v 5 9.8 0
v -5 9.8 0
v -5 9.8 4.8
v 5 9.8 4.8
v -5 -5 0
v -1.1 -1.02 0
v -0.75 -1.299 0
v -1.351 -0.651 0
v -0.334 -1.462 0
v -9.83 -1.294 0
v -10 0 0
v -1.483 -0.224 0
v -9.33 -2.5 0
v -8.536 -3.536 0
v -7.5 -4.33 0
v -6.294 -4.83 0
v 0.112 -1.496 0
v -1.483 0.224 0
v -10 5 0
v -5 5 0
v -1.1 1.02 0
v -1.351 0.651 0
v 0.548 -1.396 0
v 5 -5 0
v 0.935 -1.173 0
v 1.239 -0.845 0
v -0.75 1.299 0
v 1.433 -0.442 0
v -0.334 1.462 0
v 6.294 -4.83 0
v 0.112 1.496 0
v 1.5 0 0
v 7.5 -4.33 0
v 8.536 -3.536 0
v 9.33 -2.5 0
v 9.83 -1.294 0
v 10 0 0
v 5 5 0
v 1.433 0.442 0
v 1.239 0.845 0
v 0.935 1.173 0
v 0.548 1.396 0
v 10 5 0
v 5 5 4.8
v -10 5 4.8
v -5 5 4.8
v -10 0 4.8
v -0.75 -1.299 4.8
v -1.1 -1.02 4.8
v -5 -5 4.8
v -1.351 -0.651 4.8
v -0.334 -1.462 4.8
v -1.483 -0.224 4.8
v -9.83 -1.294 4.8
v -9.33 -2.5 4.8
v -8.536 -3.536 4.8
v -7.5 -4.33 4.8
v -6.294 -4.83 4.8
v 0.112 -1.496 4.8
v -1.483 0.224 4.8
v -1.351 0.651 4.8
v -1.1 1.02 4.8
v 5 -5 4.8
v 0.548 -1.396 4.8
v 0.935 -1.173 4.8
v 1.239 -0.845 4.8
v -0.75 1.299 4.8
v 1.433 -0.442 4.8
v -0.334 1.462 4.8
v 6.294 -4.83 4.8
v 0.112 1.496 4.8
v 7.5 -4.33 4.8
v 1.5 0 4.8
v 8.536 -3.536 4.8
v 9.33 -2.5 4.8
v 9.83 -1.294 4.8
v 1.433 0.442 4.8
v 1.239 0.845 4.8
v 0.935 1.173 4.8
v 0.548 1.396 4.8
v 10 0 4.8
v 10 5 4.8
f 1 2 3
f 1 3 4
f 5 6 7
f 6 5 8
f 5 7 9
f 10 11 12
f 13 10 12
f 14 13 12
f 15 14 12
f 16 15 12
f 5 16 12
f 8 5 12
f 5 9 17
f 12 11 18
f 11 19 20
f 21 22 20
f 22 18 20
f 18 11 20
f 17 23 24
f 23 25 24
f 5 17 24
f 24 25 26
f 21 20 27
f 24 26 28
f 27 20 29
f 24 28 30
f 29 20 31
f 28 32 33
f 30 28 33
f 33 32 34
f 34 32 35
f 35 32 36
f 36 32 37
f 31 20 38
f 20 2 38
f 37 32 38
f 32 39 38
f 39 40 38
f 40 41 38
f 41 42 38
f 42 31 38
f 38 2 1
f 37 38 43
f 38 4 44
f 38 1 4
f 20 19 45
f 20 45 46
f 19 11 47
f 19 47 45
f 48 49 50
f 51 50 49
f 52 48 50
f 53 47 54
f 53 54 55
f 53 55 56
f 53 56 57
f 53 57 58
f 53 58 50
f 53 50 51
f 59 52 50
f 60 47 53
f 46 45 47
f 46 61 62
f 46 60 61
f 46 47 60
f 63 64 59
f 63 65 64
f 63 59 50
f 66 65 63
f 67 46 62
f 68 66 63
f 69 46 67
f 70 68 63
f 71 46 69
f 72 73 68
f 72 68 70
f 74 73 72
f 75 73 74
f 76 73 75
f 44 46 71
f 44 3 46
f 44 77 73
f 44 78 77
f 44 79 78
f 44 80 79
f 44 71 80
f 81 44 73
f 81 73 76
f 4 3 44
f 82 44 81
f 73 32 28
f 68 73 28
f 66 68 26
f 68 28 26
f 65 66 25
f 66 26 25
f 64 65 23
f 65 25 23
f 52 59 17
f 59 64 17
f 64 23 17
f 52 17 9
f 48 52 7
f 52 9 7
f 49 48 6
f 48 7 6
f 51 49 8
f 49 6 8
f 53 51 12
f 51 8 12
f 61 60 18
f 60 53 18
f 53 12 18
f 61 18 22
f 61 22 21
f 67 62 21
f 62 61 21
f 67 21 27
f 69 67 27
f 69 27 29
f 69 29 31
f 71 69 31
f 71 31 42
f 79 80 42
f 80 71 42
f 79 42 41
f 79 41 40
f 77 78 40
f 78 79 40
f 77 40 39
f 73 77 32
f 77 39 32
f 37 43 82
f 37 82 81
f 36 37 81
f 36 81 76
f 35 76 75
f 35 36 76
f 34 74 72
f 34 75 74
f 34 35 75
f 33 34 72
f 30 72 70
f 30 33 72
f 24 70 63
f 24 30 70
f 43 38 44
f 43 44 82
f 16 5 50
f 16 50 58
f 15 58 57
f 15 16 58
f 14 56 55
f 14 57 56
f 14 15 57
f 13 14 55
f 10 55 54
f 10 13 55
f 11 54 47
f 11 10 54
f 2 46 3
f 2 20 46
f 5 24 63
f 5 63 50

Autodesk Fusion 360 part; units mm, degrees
sketch "Sketch1" plane through (0, 0, 0) normal (0, 0, 1) x (1, 0, 0)
  line L0 (-5, 9.8) -> (5, 9.8)
  line L1 (5, 9.8) -> (5, 5)
  line L2 (5, 5) -> (10, 5)
  line L3 (10, 5) -> (10, 0)
  line L4 (5, -5) -> (-5, -5)
  line L5 (-10, 0) -> (-10, 5)
  line L6 (-10, 5) -> (-5, 5)
  line L7 (-5, 5) -> (-5, 9.8)
  line L8 (0, 0) -> (0, 9.8) construction
  line L9 (0, 0) -> (10, 0) construction
  line L10 (0, 0) -> (0, -5) construction
  line L11 (-5, 5) -> (-5, 0) construction
  line L12 (0, 0) -> (-5, 0) construction
  circle A0 centre (0, 0) radius 1.5
  line L13 (-10, -5) -> (-10, 0) construction
  line L14 (-5, -5) -> (-10, -5) construction
  arc A1 (-5, -5) -> (-10, 0) centre (-5, 0) ccw construction
  arc A2 (-10, 0) -> (-5, -5) centre (-5, 0) ccw
  line L15 (10, -5) -> (5, -5) construction
  line L16 (10, 0) -> (10, -5) construction
  arc A3 (10, 0) -> (5, -5) centre (5, 0) ccw construction
  arc A4 (5, -5) -> (10, 0) centre (5, 0) ccw
  point P0 (0, 9.8)
  point P1 (0, -5)
  point P2 (5, 0)
  dimension "d1" = 10
  dimension "d2" = 5
  dimension "d3" = 4.8
  dimension "d5" = 3
  dimension "d6" = 10
extrude "Extrude1" add sketch "Sketch1" along normal blind 4.8
